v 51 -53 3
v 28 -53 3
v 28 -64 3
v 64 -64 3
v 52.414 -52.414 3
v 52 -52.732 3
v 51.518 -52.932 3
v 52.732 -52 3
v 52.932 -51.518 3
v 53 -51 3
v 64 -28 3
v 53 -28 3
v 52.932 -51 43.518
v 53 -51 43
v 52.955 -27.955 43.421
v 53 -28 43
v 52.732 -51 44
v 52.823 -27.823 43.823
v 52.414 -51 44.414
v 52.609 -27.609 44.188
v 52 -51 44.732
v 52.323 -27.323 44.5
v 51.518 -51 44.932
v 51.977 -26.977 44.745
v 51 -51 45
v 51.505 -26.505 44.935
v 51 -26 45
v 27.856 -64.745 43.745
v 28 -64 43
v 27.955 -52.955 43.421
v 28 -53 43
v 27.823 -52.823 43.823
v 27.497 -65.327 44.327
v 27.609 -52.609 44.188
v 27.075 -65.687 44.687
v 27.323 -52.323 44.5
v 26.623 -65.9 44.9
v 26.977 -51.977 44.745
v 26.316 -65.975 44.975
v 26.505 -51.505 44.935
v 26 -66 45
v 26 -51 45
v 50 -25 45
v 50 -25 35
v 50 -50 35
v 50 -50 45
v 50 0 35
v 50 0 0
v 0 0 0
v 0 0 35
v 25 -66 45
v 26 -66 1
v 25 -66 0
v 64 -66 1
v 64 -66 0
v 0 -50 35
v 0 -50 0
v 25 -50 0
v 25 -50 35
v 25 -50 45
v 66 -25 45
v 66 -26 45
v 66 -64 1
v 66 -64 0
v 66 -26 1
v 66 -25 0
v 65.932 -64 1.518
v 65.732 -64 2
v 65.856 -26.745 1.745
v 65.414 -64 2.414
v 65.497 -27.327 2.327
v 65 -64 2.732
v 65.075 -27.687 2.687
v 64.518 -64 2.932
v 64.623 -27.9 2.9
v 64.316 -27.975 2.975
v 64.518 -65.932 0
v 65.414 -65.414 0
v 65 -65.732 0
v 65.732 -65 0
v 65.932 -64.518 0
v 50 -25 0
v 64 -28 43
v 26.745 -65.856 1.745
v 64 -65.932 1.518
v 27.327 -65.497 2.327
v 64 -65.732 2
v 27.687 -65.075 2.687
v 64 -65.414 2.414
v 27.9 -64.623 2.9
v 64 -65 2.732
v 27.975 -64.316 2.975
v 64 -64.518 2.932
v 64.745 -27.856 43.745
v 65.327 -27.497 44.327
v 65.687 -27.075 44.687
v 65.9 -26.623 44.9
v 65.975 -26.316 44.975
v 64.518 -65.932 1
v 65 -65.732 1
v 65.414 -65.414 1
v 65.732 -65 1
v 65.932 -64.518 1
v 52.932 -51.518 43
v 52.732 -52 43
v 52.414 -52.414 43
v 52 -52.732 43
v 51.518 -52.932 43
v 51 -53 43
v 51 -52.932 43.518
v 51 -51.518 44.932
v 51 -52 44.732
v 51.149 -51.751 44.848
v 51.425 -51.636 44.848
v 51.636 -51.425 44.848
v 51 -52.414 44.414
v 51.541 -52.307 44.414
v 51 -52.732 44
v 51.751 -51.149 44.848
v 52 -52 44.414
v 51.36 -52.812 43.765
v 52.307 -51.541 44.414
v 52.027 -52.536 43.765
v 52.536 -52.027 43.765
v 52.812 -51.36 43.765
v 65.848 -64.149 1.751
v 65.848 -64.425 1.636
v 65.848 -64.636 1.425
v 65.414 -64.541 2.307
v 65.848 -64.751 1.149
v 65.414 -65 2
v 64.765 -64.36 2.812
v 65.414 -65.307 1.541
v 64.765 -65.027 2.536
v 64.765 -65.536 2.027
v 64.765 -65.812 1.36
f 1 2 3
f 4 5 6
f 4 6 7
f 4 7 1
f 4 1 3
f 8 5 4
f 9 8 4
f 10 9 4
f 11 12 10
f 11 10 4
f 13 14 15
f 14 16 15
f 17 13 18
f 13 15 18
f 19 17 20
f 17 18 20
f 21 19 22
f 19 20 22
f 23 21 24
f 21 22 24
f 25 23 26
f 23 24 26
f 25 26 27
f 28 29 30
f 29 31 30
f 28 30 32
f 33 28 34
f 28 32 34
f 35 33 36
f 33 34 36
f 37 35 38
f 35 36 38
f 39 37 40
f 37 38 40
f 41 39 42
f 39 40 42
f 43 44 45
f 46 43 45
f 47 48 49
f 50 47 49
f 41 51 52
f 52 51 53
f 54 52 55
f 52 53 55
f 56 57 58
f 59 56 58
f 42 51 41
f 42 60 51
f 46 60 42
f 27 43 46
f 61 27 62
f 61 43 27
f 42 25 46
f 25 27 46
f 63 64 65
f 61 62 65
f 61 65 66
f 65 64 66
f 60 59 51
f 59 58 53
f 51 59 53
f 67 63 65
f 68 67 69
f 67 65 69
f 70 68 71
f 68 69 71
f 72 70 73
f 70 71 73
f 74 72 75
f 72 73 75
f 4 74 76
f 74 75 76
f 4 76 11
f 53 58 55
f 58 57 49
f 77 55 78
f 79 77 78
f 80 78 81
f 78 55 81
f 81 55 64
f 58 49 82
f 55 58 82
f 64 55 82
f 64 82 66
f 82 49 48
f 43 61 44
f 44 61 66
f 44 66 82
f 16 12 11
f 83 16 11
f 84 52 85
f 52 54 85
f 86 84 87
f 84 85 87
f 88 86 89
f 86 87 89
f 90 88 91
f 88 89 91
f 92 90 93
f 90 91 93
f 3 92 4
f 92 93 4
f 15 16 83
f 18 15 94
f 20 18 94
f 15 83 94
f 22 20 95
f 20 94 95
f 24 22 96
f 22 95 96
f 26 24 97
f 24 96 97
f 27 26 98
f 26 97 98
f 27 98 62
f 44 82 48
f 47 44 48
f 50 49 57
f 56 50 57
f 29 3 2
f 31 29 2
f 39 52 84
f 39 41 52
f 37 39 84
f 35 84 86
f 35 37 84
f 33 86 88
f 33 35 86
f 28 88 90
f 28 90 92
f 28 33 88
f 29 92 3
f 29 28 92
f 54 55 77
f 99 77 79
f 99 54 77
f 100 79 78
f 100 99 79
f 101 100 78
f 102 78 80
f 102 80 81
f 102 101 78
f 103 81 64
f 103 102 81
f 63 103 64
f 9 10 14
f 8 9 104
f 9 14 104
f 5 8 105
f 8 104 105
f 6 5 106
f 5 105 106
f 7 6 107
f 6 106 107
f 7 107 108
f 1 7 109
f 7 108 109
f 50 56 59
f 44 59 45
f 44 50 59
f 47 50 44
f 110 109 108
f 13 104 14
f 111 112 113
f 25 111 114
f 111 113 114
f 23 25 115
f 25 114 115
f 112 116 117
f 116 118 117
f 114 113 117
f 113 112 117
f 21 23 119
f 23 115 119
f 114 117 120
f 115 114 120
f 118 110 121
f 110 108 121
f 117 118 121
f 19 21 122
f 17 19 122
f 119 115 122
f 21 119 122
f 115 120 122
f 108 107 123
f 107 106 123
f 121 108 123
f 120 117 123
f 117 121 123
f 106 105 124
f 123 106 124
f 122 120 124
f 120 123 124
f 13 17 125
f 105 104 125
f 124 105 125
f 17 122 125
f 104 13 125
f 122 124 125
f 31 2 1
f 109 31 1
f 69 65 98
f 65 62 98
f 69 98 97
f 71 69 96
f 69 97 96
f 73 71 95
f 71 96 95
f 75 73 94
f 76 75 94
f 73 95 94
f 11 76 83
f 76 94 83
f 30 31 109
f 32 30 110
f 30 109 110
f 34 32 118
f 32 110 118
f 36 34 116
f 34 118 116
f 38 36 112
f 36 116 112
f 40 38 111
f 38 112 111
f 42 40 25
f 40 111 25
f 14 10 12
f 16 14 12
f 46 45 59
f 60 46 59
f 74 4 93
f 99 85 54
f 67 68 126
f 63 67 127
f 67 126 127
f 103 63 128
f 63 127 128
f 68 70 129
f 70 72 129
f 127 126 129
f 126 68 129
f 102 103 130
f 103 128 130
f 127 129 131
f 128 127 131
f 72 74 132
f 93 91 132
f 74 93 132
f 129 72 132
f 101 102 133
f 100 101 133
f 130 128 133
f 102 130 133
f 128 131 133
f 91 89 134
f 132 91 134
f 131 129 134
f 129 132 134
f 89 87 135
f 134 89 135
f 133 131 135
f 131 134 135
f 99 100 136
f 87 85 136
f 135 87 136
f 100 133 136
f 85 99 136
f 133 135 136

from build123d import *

# Parameters (mm, degrees)
F1_DEPTH = 35
F2_DEPTH = 45
F3_DEPTH = 3
F4_R     = 2


with BuildPart() as f1:
    # F0 (on Top) → F1 (new body)
    with BuildSketch(Plane.XY):
        Polygon((50, 0), (0, 0), (0, -50), (25, -50), (28, -50), (50, -50), (50, -28), (50, -25), align=None)
    extrude(amount=F1_DEPTH)

    # F0 (on Top) → F2 (join)
    with BuildSketch(Plane.XY):
        Polygon((28, -50), (25, -50), (25, -66), (28, -66), (28, -53), align=None)
        Polygon((66, -25), (50, -25), (50, -28), (53, -28), (66, -28), align=None)
        Polygon((53, -28), (50, -28), (50, -50), (28, -50), (28, -53), (53, -53), align=None)
    extrude(amount=F2_DEPTH)

    # F0 (on Top) → F3 (join)
    with BuildSketch(Plane.XY):
        Polygon((50, 0), (0, 0), (0, -50), (25, -50), (28, -50), (50, -50), (50, -28), (50, -25), align=None)
        Polygon((66, -25), (50, -25), (50, -28), (53, -28), (66, -28), align=None)
        Polygon((28, -50), (25, -50), (25, -66), (28, -66), (28, -53), align=None)
        Polygon((66, -28), (53, -28), (53, -53), (28, -53), (28, -66), (66, -66), align=None)
    extrude(amount=F3_DEPTH)

    # F4
    f4_edges = [f1.edges().sort_by_distance(p)[0] for p in [
        (47, -66, 3),
        (66, -47, 3),
        (66, -66, 1.5),
        (53, -53, 24),
        (40.5, -53, 45),
        (28, -59.5, 45),
        (53, -40.5, 45),
        (59.5, -28, 45),
        (66, -28, 24),
        (28, -66, 24),
    ]]
    fillet(f4_edges, radius=F4_R)


solid = f1.part
